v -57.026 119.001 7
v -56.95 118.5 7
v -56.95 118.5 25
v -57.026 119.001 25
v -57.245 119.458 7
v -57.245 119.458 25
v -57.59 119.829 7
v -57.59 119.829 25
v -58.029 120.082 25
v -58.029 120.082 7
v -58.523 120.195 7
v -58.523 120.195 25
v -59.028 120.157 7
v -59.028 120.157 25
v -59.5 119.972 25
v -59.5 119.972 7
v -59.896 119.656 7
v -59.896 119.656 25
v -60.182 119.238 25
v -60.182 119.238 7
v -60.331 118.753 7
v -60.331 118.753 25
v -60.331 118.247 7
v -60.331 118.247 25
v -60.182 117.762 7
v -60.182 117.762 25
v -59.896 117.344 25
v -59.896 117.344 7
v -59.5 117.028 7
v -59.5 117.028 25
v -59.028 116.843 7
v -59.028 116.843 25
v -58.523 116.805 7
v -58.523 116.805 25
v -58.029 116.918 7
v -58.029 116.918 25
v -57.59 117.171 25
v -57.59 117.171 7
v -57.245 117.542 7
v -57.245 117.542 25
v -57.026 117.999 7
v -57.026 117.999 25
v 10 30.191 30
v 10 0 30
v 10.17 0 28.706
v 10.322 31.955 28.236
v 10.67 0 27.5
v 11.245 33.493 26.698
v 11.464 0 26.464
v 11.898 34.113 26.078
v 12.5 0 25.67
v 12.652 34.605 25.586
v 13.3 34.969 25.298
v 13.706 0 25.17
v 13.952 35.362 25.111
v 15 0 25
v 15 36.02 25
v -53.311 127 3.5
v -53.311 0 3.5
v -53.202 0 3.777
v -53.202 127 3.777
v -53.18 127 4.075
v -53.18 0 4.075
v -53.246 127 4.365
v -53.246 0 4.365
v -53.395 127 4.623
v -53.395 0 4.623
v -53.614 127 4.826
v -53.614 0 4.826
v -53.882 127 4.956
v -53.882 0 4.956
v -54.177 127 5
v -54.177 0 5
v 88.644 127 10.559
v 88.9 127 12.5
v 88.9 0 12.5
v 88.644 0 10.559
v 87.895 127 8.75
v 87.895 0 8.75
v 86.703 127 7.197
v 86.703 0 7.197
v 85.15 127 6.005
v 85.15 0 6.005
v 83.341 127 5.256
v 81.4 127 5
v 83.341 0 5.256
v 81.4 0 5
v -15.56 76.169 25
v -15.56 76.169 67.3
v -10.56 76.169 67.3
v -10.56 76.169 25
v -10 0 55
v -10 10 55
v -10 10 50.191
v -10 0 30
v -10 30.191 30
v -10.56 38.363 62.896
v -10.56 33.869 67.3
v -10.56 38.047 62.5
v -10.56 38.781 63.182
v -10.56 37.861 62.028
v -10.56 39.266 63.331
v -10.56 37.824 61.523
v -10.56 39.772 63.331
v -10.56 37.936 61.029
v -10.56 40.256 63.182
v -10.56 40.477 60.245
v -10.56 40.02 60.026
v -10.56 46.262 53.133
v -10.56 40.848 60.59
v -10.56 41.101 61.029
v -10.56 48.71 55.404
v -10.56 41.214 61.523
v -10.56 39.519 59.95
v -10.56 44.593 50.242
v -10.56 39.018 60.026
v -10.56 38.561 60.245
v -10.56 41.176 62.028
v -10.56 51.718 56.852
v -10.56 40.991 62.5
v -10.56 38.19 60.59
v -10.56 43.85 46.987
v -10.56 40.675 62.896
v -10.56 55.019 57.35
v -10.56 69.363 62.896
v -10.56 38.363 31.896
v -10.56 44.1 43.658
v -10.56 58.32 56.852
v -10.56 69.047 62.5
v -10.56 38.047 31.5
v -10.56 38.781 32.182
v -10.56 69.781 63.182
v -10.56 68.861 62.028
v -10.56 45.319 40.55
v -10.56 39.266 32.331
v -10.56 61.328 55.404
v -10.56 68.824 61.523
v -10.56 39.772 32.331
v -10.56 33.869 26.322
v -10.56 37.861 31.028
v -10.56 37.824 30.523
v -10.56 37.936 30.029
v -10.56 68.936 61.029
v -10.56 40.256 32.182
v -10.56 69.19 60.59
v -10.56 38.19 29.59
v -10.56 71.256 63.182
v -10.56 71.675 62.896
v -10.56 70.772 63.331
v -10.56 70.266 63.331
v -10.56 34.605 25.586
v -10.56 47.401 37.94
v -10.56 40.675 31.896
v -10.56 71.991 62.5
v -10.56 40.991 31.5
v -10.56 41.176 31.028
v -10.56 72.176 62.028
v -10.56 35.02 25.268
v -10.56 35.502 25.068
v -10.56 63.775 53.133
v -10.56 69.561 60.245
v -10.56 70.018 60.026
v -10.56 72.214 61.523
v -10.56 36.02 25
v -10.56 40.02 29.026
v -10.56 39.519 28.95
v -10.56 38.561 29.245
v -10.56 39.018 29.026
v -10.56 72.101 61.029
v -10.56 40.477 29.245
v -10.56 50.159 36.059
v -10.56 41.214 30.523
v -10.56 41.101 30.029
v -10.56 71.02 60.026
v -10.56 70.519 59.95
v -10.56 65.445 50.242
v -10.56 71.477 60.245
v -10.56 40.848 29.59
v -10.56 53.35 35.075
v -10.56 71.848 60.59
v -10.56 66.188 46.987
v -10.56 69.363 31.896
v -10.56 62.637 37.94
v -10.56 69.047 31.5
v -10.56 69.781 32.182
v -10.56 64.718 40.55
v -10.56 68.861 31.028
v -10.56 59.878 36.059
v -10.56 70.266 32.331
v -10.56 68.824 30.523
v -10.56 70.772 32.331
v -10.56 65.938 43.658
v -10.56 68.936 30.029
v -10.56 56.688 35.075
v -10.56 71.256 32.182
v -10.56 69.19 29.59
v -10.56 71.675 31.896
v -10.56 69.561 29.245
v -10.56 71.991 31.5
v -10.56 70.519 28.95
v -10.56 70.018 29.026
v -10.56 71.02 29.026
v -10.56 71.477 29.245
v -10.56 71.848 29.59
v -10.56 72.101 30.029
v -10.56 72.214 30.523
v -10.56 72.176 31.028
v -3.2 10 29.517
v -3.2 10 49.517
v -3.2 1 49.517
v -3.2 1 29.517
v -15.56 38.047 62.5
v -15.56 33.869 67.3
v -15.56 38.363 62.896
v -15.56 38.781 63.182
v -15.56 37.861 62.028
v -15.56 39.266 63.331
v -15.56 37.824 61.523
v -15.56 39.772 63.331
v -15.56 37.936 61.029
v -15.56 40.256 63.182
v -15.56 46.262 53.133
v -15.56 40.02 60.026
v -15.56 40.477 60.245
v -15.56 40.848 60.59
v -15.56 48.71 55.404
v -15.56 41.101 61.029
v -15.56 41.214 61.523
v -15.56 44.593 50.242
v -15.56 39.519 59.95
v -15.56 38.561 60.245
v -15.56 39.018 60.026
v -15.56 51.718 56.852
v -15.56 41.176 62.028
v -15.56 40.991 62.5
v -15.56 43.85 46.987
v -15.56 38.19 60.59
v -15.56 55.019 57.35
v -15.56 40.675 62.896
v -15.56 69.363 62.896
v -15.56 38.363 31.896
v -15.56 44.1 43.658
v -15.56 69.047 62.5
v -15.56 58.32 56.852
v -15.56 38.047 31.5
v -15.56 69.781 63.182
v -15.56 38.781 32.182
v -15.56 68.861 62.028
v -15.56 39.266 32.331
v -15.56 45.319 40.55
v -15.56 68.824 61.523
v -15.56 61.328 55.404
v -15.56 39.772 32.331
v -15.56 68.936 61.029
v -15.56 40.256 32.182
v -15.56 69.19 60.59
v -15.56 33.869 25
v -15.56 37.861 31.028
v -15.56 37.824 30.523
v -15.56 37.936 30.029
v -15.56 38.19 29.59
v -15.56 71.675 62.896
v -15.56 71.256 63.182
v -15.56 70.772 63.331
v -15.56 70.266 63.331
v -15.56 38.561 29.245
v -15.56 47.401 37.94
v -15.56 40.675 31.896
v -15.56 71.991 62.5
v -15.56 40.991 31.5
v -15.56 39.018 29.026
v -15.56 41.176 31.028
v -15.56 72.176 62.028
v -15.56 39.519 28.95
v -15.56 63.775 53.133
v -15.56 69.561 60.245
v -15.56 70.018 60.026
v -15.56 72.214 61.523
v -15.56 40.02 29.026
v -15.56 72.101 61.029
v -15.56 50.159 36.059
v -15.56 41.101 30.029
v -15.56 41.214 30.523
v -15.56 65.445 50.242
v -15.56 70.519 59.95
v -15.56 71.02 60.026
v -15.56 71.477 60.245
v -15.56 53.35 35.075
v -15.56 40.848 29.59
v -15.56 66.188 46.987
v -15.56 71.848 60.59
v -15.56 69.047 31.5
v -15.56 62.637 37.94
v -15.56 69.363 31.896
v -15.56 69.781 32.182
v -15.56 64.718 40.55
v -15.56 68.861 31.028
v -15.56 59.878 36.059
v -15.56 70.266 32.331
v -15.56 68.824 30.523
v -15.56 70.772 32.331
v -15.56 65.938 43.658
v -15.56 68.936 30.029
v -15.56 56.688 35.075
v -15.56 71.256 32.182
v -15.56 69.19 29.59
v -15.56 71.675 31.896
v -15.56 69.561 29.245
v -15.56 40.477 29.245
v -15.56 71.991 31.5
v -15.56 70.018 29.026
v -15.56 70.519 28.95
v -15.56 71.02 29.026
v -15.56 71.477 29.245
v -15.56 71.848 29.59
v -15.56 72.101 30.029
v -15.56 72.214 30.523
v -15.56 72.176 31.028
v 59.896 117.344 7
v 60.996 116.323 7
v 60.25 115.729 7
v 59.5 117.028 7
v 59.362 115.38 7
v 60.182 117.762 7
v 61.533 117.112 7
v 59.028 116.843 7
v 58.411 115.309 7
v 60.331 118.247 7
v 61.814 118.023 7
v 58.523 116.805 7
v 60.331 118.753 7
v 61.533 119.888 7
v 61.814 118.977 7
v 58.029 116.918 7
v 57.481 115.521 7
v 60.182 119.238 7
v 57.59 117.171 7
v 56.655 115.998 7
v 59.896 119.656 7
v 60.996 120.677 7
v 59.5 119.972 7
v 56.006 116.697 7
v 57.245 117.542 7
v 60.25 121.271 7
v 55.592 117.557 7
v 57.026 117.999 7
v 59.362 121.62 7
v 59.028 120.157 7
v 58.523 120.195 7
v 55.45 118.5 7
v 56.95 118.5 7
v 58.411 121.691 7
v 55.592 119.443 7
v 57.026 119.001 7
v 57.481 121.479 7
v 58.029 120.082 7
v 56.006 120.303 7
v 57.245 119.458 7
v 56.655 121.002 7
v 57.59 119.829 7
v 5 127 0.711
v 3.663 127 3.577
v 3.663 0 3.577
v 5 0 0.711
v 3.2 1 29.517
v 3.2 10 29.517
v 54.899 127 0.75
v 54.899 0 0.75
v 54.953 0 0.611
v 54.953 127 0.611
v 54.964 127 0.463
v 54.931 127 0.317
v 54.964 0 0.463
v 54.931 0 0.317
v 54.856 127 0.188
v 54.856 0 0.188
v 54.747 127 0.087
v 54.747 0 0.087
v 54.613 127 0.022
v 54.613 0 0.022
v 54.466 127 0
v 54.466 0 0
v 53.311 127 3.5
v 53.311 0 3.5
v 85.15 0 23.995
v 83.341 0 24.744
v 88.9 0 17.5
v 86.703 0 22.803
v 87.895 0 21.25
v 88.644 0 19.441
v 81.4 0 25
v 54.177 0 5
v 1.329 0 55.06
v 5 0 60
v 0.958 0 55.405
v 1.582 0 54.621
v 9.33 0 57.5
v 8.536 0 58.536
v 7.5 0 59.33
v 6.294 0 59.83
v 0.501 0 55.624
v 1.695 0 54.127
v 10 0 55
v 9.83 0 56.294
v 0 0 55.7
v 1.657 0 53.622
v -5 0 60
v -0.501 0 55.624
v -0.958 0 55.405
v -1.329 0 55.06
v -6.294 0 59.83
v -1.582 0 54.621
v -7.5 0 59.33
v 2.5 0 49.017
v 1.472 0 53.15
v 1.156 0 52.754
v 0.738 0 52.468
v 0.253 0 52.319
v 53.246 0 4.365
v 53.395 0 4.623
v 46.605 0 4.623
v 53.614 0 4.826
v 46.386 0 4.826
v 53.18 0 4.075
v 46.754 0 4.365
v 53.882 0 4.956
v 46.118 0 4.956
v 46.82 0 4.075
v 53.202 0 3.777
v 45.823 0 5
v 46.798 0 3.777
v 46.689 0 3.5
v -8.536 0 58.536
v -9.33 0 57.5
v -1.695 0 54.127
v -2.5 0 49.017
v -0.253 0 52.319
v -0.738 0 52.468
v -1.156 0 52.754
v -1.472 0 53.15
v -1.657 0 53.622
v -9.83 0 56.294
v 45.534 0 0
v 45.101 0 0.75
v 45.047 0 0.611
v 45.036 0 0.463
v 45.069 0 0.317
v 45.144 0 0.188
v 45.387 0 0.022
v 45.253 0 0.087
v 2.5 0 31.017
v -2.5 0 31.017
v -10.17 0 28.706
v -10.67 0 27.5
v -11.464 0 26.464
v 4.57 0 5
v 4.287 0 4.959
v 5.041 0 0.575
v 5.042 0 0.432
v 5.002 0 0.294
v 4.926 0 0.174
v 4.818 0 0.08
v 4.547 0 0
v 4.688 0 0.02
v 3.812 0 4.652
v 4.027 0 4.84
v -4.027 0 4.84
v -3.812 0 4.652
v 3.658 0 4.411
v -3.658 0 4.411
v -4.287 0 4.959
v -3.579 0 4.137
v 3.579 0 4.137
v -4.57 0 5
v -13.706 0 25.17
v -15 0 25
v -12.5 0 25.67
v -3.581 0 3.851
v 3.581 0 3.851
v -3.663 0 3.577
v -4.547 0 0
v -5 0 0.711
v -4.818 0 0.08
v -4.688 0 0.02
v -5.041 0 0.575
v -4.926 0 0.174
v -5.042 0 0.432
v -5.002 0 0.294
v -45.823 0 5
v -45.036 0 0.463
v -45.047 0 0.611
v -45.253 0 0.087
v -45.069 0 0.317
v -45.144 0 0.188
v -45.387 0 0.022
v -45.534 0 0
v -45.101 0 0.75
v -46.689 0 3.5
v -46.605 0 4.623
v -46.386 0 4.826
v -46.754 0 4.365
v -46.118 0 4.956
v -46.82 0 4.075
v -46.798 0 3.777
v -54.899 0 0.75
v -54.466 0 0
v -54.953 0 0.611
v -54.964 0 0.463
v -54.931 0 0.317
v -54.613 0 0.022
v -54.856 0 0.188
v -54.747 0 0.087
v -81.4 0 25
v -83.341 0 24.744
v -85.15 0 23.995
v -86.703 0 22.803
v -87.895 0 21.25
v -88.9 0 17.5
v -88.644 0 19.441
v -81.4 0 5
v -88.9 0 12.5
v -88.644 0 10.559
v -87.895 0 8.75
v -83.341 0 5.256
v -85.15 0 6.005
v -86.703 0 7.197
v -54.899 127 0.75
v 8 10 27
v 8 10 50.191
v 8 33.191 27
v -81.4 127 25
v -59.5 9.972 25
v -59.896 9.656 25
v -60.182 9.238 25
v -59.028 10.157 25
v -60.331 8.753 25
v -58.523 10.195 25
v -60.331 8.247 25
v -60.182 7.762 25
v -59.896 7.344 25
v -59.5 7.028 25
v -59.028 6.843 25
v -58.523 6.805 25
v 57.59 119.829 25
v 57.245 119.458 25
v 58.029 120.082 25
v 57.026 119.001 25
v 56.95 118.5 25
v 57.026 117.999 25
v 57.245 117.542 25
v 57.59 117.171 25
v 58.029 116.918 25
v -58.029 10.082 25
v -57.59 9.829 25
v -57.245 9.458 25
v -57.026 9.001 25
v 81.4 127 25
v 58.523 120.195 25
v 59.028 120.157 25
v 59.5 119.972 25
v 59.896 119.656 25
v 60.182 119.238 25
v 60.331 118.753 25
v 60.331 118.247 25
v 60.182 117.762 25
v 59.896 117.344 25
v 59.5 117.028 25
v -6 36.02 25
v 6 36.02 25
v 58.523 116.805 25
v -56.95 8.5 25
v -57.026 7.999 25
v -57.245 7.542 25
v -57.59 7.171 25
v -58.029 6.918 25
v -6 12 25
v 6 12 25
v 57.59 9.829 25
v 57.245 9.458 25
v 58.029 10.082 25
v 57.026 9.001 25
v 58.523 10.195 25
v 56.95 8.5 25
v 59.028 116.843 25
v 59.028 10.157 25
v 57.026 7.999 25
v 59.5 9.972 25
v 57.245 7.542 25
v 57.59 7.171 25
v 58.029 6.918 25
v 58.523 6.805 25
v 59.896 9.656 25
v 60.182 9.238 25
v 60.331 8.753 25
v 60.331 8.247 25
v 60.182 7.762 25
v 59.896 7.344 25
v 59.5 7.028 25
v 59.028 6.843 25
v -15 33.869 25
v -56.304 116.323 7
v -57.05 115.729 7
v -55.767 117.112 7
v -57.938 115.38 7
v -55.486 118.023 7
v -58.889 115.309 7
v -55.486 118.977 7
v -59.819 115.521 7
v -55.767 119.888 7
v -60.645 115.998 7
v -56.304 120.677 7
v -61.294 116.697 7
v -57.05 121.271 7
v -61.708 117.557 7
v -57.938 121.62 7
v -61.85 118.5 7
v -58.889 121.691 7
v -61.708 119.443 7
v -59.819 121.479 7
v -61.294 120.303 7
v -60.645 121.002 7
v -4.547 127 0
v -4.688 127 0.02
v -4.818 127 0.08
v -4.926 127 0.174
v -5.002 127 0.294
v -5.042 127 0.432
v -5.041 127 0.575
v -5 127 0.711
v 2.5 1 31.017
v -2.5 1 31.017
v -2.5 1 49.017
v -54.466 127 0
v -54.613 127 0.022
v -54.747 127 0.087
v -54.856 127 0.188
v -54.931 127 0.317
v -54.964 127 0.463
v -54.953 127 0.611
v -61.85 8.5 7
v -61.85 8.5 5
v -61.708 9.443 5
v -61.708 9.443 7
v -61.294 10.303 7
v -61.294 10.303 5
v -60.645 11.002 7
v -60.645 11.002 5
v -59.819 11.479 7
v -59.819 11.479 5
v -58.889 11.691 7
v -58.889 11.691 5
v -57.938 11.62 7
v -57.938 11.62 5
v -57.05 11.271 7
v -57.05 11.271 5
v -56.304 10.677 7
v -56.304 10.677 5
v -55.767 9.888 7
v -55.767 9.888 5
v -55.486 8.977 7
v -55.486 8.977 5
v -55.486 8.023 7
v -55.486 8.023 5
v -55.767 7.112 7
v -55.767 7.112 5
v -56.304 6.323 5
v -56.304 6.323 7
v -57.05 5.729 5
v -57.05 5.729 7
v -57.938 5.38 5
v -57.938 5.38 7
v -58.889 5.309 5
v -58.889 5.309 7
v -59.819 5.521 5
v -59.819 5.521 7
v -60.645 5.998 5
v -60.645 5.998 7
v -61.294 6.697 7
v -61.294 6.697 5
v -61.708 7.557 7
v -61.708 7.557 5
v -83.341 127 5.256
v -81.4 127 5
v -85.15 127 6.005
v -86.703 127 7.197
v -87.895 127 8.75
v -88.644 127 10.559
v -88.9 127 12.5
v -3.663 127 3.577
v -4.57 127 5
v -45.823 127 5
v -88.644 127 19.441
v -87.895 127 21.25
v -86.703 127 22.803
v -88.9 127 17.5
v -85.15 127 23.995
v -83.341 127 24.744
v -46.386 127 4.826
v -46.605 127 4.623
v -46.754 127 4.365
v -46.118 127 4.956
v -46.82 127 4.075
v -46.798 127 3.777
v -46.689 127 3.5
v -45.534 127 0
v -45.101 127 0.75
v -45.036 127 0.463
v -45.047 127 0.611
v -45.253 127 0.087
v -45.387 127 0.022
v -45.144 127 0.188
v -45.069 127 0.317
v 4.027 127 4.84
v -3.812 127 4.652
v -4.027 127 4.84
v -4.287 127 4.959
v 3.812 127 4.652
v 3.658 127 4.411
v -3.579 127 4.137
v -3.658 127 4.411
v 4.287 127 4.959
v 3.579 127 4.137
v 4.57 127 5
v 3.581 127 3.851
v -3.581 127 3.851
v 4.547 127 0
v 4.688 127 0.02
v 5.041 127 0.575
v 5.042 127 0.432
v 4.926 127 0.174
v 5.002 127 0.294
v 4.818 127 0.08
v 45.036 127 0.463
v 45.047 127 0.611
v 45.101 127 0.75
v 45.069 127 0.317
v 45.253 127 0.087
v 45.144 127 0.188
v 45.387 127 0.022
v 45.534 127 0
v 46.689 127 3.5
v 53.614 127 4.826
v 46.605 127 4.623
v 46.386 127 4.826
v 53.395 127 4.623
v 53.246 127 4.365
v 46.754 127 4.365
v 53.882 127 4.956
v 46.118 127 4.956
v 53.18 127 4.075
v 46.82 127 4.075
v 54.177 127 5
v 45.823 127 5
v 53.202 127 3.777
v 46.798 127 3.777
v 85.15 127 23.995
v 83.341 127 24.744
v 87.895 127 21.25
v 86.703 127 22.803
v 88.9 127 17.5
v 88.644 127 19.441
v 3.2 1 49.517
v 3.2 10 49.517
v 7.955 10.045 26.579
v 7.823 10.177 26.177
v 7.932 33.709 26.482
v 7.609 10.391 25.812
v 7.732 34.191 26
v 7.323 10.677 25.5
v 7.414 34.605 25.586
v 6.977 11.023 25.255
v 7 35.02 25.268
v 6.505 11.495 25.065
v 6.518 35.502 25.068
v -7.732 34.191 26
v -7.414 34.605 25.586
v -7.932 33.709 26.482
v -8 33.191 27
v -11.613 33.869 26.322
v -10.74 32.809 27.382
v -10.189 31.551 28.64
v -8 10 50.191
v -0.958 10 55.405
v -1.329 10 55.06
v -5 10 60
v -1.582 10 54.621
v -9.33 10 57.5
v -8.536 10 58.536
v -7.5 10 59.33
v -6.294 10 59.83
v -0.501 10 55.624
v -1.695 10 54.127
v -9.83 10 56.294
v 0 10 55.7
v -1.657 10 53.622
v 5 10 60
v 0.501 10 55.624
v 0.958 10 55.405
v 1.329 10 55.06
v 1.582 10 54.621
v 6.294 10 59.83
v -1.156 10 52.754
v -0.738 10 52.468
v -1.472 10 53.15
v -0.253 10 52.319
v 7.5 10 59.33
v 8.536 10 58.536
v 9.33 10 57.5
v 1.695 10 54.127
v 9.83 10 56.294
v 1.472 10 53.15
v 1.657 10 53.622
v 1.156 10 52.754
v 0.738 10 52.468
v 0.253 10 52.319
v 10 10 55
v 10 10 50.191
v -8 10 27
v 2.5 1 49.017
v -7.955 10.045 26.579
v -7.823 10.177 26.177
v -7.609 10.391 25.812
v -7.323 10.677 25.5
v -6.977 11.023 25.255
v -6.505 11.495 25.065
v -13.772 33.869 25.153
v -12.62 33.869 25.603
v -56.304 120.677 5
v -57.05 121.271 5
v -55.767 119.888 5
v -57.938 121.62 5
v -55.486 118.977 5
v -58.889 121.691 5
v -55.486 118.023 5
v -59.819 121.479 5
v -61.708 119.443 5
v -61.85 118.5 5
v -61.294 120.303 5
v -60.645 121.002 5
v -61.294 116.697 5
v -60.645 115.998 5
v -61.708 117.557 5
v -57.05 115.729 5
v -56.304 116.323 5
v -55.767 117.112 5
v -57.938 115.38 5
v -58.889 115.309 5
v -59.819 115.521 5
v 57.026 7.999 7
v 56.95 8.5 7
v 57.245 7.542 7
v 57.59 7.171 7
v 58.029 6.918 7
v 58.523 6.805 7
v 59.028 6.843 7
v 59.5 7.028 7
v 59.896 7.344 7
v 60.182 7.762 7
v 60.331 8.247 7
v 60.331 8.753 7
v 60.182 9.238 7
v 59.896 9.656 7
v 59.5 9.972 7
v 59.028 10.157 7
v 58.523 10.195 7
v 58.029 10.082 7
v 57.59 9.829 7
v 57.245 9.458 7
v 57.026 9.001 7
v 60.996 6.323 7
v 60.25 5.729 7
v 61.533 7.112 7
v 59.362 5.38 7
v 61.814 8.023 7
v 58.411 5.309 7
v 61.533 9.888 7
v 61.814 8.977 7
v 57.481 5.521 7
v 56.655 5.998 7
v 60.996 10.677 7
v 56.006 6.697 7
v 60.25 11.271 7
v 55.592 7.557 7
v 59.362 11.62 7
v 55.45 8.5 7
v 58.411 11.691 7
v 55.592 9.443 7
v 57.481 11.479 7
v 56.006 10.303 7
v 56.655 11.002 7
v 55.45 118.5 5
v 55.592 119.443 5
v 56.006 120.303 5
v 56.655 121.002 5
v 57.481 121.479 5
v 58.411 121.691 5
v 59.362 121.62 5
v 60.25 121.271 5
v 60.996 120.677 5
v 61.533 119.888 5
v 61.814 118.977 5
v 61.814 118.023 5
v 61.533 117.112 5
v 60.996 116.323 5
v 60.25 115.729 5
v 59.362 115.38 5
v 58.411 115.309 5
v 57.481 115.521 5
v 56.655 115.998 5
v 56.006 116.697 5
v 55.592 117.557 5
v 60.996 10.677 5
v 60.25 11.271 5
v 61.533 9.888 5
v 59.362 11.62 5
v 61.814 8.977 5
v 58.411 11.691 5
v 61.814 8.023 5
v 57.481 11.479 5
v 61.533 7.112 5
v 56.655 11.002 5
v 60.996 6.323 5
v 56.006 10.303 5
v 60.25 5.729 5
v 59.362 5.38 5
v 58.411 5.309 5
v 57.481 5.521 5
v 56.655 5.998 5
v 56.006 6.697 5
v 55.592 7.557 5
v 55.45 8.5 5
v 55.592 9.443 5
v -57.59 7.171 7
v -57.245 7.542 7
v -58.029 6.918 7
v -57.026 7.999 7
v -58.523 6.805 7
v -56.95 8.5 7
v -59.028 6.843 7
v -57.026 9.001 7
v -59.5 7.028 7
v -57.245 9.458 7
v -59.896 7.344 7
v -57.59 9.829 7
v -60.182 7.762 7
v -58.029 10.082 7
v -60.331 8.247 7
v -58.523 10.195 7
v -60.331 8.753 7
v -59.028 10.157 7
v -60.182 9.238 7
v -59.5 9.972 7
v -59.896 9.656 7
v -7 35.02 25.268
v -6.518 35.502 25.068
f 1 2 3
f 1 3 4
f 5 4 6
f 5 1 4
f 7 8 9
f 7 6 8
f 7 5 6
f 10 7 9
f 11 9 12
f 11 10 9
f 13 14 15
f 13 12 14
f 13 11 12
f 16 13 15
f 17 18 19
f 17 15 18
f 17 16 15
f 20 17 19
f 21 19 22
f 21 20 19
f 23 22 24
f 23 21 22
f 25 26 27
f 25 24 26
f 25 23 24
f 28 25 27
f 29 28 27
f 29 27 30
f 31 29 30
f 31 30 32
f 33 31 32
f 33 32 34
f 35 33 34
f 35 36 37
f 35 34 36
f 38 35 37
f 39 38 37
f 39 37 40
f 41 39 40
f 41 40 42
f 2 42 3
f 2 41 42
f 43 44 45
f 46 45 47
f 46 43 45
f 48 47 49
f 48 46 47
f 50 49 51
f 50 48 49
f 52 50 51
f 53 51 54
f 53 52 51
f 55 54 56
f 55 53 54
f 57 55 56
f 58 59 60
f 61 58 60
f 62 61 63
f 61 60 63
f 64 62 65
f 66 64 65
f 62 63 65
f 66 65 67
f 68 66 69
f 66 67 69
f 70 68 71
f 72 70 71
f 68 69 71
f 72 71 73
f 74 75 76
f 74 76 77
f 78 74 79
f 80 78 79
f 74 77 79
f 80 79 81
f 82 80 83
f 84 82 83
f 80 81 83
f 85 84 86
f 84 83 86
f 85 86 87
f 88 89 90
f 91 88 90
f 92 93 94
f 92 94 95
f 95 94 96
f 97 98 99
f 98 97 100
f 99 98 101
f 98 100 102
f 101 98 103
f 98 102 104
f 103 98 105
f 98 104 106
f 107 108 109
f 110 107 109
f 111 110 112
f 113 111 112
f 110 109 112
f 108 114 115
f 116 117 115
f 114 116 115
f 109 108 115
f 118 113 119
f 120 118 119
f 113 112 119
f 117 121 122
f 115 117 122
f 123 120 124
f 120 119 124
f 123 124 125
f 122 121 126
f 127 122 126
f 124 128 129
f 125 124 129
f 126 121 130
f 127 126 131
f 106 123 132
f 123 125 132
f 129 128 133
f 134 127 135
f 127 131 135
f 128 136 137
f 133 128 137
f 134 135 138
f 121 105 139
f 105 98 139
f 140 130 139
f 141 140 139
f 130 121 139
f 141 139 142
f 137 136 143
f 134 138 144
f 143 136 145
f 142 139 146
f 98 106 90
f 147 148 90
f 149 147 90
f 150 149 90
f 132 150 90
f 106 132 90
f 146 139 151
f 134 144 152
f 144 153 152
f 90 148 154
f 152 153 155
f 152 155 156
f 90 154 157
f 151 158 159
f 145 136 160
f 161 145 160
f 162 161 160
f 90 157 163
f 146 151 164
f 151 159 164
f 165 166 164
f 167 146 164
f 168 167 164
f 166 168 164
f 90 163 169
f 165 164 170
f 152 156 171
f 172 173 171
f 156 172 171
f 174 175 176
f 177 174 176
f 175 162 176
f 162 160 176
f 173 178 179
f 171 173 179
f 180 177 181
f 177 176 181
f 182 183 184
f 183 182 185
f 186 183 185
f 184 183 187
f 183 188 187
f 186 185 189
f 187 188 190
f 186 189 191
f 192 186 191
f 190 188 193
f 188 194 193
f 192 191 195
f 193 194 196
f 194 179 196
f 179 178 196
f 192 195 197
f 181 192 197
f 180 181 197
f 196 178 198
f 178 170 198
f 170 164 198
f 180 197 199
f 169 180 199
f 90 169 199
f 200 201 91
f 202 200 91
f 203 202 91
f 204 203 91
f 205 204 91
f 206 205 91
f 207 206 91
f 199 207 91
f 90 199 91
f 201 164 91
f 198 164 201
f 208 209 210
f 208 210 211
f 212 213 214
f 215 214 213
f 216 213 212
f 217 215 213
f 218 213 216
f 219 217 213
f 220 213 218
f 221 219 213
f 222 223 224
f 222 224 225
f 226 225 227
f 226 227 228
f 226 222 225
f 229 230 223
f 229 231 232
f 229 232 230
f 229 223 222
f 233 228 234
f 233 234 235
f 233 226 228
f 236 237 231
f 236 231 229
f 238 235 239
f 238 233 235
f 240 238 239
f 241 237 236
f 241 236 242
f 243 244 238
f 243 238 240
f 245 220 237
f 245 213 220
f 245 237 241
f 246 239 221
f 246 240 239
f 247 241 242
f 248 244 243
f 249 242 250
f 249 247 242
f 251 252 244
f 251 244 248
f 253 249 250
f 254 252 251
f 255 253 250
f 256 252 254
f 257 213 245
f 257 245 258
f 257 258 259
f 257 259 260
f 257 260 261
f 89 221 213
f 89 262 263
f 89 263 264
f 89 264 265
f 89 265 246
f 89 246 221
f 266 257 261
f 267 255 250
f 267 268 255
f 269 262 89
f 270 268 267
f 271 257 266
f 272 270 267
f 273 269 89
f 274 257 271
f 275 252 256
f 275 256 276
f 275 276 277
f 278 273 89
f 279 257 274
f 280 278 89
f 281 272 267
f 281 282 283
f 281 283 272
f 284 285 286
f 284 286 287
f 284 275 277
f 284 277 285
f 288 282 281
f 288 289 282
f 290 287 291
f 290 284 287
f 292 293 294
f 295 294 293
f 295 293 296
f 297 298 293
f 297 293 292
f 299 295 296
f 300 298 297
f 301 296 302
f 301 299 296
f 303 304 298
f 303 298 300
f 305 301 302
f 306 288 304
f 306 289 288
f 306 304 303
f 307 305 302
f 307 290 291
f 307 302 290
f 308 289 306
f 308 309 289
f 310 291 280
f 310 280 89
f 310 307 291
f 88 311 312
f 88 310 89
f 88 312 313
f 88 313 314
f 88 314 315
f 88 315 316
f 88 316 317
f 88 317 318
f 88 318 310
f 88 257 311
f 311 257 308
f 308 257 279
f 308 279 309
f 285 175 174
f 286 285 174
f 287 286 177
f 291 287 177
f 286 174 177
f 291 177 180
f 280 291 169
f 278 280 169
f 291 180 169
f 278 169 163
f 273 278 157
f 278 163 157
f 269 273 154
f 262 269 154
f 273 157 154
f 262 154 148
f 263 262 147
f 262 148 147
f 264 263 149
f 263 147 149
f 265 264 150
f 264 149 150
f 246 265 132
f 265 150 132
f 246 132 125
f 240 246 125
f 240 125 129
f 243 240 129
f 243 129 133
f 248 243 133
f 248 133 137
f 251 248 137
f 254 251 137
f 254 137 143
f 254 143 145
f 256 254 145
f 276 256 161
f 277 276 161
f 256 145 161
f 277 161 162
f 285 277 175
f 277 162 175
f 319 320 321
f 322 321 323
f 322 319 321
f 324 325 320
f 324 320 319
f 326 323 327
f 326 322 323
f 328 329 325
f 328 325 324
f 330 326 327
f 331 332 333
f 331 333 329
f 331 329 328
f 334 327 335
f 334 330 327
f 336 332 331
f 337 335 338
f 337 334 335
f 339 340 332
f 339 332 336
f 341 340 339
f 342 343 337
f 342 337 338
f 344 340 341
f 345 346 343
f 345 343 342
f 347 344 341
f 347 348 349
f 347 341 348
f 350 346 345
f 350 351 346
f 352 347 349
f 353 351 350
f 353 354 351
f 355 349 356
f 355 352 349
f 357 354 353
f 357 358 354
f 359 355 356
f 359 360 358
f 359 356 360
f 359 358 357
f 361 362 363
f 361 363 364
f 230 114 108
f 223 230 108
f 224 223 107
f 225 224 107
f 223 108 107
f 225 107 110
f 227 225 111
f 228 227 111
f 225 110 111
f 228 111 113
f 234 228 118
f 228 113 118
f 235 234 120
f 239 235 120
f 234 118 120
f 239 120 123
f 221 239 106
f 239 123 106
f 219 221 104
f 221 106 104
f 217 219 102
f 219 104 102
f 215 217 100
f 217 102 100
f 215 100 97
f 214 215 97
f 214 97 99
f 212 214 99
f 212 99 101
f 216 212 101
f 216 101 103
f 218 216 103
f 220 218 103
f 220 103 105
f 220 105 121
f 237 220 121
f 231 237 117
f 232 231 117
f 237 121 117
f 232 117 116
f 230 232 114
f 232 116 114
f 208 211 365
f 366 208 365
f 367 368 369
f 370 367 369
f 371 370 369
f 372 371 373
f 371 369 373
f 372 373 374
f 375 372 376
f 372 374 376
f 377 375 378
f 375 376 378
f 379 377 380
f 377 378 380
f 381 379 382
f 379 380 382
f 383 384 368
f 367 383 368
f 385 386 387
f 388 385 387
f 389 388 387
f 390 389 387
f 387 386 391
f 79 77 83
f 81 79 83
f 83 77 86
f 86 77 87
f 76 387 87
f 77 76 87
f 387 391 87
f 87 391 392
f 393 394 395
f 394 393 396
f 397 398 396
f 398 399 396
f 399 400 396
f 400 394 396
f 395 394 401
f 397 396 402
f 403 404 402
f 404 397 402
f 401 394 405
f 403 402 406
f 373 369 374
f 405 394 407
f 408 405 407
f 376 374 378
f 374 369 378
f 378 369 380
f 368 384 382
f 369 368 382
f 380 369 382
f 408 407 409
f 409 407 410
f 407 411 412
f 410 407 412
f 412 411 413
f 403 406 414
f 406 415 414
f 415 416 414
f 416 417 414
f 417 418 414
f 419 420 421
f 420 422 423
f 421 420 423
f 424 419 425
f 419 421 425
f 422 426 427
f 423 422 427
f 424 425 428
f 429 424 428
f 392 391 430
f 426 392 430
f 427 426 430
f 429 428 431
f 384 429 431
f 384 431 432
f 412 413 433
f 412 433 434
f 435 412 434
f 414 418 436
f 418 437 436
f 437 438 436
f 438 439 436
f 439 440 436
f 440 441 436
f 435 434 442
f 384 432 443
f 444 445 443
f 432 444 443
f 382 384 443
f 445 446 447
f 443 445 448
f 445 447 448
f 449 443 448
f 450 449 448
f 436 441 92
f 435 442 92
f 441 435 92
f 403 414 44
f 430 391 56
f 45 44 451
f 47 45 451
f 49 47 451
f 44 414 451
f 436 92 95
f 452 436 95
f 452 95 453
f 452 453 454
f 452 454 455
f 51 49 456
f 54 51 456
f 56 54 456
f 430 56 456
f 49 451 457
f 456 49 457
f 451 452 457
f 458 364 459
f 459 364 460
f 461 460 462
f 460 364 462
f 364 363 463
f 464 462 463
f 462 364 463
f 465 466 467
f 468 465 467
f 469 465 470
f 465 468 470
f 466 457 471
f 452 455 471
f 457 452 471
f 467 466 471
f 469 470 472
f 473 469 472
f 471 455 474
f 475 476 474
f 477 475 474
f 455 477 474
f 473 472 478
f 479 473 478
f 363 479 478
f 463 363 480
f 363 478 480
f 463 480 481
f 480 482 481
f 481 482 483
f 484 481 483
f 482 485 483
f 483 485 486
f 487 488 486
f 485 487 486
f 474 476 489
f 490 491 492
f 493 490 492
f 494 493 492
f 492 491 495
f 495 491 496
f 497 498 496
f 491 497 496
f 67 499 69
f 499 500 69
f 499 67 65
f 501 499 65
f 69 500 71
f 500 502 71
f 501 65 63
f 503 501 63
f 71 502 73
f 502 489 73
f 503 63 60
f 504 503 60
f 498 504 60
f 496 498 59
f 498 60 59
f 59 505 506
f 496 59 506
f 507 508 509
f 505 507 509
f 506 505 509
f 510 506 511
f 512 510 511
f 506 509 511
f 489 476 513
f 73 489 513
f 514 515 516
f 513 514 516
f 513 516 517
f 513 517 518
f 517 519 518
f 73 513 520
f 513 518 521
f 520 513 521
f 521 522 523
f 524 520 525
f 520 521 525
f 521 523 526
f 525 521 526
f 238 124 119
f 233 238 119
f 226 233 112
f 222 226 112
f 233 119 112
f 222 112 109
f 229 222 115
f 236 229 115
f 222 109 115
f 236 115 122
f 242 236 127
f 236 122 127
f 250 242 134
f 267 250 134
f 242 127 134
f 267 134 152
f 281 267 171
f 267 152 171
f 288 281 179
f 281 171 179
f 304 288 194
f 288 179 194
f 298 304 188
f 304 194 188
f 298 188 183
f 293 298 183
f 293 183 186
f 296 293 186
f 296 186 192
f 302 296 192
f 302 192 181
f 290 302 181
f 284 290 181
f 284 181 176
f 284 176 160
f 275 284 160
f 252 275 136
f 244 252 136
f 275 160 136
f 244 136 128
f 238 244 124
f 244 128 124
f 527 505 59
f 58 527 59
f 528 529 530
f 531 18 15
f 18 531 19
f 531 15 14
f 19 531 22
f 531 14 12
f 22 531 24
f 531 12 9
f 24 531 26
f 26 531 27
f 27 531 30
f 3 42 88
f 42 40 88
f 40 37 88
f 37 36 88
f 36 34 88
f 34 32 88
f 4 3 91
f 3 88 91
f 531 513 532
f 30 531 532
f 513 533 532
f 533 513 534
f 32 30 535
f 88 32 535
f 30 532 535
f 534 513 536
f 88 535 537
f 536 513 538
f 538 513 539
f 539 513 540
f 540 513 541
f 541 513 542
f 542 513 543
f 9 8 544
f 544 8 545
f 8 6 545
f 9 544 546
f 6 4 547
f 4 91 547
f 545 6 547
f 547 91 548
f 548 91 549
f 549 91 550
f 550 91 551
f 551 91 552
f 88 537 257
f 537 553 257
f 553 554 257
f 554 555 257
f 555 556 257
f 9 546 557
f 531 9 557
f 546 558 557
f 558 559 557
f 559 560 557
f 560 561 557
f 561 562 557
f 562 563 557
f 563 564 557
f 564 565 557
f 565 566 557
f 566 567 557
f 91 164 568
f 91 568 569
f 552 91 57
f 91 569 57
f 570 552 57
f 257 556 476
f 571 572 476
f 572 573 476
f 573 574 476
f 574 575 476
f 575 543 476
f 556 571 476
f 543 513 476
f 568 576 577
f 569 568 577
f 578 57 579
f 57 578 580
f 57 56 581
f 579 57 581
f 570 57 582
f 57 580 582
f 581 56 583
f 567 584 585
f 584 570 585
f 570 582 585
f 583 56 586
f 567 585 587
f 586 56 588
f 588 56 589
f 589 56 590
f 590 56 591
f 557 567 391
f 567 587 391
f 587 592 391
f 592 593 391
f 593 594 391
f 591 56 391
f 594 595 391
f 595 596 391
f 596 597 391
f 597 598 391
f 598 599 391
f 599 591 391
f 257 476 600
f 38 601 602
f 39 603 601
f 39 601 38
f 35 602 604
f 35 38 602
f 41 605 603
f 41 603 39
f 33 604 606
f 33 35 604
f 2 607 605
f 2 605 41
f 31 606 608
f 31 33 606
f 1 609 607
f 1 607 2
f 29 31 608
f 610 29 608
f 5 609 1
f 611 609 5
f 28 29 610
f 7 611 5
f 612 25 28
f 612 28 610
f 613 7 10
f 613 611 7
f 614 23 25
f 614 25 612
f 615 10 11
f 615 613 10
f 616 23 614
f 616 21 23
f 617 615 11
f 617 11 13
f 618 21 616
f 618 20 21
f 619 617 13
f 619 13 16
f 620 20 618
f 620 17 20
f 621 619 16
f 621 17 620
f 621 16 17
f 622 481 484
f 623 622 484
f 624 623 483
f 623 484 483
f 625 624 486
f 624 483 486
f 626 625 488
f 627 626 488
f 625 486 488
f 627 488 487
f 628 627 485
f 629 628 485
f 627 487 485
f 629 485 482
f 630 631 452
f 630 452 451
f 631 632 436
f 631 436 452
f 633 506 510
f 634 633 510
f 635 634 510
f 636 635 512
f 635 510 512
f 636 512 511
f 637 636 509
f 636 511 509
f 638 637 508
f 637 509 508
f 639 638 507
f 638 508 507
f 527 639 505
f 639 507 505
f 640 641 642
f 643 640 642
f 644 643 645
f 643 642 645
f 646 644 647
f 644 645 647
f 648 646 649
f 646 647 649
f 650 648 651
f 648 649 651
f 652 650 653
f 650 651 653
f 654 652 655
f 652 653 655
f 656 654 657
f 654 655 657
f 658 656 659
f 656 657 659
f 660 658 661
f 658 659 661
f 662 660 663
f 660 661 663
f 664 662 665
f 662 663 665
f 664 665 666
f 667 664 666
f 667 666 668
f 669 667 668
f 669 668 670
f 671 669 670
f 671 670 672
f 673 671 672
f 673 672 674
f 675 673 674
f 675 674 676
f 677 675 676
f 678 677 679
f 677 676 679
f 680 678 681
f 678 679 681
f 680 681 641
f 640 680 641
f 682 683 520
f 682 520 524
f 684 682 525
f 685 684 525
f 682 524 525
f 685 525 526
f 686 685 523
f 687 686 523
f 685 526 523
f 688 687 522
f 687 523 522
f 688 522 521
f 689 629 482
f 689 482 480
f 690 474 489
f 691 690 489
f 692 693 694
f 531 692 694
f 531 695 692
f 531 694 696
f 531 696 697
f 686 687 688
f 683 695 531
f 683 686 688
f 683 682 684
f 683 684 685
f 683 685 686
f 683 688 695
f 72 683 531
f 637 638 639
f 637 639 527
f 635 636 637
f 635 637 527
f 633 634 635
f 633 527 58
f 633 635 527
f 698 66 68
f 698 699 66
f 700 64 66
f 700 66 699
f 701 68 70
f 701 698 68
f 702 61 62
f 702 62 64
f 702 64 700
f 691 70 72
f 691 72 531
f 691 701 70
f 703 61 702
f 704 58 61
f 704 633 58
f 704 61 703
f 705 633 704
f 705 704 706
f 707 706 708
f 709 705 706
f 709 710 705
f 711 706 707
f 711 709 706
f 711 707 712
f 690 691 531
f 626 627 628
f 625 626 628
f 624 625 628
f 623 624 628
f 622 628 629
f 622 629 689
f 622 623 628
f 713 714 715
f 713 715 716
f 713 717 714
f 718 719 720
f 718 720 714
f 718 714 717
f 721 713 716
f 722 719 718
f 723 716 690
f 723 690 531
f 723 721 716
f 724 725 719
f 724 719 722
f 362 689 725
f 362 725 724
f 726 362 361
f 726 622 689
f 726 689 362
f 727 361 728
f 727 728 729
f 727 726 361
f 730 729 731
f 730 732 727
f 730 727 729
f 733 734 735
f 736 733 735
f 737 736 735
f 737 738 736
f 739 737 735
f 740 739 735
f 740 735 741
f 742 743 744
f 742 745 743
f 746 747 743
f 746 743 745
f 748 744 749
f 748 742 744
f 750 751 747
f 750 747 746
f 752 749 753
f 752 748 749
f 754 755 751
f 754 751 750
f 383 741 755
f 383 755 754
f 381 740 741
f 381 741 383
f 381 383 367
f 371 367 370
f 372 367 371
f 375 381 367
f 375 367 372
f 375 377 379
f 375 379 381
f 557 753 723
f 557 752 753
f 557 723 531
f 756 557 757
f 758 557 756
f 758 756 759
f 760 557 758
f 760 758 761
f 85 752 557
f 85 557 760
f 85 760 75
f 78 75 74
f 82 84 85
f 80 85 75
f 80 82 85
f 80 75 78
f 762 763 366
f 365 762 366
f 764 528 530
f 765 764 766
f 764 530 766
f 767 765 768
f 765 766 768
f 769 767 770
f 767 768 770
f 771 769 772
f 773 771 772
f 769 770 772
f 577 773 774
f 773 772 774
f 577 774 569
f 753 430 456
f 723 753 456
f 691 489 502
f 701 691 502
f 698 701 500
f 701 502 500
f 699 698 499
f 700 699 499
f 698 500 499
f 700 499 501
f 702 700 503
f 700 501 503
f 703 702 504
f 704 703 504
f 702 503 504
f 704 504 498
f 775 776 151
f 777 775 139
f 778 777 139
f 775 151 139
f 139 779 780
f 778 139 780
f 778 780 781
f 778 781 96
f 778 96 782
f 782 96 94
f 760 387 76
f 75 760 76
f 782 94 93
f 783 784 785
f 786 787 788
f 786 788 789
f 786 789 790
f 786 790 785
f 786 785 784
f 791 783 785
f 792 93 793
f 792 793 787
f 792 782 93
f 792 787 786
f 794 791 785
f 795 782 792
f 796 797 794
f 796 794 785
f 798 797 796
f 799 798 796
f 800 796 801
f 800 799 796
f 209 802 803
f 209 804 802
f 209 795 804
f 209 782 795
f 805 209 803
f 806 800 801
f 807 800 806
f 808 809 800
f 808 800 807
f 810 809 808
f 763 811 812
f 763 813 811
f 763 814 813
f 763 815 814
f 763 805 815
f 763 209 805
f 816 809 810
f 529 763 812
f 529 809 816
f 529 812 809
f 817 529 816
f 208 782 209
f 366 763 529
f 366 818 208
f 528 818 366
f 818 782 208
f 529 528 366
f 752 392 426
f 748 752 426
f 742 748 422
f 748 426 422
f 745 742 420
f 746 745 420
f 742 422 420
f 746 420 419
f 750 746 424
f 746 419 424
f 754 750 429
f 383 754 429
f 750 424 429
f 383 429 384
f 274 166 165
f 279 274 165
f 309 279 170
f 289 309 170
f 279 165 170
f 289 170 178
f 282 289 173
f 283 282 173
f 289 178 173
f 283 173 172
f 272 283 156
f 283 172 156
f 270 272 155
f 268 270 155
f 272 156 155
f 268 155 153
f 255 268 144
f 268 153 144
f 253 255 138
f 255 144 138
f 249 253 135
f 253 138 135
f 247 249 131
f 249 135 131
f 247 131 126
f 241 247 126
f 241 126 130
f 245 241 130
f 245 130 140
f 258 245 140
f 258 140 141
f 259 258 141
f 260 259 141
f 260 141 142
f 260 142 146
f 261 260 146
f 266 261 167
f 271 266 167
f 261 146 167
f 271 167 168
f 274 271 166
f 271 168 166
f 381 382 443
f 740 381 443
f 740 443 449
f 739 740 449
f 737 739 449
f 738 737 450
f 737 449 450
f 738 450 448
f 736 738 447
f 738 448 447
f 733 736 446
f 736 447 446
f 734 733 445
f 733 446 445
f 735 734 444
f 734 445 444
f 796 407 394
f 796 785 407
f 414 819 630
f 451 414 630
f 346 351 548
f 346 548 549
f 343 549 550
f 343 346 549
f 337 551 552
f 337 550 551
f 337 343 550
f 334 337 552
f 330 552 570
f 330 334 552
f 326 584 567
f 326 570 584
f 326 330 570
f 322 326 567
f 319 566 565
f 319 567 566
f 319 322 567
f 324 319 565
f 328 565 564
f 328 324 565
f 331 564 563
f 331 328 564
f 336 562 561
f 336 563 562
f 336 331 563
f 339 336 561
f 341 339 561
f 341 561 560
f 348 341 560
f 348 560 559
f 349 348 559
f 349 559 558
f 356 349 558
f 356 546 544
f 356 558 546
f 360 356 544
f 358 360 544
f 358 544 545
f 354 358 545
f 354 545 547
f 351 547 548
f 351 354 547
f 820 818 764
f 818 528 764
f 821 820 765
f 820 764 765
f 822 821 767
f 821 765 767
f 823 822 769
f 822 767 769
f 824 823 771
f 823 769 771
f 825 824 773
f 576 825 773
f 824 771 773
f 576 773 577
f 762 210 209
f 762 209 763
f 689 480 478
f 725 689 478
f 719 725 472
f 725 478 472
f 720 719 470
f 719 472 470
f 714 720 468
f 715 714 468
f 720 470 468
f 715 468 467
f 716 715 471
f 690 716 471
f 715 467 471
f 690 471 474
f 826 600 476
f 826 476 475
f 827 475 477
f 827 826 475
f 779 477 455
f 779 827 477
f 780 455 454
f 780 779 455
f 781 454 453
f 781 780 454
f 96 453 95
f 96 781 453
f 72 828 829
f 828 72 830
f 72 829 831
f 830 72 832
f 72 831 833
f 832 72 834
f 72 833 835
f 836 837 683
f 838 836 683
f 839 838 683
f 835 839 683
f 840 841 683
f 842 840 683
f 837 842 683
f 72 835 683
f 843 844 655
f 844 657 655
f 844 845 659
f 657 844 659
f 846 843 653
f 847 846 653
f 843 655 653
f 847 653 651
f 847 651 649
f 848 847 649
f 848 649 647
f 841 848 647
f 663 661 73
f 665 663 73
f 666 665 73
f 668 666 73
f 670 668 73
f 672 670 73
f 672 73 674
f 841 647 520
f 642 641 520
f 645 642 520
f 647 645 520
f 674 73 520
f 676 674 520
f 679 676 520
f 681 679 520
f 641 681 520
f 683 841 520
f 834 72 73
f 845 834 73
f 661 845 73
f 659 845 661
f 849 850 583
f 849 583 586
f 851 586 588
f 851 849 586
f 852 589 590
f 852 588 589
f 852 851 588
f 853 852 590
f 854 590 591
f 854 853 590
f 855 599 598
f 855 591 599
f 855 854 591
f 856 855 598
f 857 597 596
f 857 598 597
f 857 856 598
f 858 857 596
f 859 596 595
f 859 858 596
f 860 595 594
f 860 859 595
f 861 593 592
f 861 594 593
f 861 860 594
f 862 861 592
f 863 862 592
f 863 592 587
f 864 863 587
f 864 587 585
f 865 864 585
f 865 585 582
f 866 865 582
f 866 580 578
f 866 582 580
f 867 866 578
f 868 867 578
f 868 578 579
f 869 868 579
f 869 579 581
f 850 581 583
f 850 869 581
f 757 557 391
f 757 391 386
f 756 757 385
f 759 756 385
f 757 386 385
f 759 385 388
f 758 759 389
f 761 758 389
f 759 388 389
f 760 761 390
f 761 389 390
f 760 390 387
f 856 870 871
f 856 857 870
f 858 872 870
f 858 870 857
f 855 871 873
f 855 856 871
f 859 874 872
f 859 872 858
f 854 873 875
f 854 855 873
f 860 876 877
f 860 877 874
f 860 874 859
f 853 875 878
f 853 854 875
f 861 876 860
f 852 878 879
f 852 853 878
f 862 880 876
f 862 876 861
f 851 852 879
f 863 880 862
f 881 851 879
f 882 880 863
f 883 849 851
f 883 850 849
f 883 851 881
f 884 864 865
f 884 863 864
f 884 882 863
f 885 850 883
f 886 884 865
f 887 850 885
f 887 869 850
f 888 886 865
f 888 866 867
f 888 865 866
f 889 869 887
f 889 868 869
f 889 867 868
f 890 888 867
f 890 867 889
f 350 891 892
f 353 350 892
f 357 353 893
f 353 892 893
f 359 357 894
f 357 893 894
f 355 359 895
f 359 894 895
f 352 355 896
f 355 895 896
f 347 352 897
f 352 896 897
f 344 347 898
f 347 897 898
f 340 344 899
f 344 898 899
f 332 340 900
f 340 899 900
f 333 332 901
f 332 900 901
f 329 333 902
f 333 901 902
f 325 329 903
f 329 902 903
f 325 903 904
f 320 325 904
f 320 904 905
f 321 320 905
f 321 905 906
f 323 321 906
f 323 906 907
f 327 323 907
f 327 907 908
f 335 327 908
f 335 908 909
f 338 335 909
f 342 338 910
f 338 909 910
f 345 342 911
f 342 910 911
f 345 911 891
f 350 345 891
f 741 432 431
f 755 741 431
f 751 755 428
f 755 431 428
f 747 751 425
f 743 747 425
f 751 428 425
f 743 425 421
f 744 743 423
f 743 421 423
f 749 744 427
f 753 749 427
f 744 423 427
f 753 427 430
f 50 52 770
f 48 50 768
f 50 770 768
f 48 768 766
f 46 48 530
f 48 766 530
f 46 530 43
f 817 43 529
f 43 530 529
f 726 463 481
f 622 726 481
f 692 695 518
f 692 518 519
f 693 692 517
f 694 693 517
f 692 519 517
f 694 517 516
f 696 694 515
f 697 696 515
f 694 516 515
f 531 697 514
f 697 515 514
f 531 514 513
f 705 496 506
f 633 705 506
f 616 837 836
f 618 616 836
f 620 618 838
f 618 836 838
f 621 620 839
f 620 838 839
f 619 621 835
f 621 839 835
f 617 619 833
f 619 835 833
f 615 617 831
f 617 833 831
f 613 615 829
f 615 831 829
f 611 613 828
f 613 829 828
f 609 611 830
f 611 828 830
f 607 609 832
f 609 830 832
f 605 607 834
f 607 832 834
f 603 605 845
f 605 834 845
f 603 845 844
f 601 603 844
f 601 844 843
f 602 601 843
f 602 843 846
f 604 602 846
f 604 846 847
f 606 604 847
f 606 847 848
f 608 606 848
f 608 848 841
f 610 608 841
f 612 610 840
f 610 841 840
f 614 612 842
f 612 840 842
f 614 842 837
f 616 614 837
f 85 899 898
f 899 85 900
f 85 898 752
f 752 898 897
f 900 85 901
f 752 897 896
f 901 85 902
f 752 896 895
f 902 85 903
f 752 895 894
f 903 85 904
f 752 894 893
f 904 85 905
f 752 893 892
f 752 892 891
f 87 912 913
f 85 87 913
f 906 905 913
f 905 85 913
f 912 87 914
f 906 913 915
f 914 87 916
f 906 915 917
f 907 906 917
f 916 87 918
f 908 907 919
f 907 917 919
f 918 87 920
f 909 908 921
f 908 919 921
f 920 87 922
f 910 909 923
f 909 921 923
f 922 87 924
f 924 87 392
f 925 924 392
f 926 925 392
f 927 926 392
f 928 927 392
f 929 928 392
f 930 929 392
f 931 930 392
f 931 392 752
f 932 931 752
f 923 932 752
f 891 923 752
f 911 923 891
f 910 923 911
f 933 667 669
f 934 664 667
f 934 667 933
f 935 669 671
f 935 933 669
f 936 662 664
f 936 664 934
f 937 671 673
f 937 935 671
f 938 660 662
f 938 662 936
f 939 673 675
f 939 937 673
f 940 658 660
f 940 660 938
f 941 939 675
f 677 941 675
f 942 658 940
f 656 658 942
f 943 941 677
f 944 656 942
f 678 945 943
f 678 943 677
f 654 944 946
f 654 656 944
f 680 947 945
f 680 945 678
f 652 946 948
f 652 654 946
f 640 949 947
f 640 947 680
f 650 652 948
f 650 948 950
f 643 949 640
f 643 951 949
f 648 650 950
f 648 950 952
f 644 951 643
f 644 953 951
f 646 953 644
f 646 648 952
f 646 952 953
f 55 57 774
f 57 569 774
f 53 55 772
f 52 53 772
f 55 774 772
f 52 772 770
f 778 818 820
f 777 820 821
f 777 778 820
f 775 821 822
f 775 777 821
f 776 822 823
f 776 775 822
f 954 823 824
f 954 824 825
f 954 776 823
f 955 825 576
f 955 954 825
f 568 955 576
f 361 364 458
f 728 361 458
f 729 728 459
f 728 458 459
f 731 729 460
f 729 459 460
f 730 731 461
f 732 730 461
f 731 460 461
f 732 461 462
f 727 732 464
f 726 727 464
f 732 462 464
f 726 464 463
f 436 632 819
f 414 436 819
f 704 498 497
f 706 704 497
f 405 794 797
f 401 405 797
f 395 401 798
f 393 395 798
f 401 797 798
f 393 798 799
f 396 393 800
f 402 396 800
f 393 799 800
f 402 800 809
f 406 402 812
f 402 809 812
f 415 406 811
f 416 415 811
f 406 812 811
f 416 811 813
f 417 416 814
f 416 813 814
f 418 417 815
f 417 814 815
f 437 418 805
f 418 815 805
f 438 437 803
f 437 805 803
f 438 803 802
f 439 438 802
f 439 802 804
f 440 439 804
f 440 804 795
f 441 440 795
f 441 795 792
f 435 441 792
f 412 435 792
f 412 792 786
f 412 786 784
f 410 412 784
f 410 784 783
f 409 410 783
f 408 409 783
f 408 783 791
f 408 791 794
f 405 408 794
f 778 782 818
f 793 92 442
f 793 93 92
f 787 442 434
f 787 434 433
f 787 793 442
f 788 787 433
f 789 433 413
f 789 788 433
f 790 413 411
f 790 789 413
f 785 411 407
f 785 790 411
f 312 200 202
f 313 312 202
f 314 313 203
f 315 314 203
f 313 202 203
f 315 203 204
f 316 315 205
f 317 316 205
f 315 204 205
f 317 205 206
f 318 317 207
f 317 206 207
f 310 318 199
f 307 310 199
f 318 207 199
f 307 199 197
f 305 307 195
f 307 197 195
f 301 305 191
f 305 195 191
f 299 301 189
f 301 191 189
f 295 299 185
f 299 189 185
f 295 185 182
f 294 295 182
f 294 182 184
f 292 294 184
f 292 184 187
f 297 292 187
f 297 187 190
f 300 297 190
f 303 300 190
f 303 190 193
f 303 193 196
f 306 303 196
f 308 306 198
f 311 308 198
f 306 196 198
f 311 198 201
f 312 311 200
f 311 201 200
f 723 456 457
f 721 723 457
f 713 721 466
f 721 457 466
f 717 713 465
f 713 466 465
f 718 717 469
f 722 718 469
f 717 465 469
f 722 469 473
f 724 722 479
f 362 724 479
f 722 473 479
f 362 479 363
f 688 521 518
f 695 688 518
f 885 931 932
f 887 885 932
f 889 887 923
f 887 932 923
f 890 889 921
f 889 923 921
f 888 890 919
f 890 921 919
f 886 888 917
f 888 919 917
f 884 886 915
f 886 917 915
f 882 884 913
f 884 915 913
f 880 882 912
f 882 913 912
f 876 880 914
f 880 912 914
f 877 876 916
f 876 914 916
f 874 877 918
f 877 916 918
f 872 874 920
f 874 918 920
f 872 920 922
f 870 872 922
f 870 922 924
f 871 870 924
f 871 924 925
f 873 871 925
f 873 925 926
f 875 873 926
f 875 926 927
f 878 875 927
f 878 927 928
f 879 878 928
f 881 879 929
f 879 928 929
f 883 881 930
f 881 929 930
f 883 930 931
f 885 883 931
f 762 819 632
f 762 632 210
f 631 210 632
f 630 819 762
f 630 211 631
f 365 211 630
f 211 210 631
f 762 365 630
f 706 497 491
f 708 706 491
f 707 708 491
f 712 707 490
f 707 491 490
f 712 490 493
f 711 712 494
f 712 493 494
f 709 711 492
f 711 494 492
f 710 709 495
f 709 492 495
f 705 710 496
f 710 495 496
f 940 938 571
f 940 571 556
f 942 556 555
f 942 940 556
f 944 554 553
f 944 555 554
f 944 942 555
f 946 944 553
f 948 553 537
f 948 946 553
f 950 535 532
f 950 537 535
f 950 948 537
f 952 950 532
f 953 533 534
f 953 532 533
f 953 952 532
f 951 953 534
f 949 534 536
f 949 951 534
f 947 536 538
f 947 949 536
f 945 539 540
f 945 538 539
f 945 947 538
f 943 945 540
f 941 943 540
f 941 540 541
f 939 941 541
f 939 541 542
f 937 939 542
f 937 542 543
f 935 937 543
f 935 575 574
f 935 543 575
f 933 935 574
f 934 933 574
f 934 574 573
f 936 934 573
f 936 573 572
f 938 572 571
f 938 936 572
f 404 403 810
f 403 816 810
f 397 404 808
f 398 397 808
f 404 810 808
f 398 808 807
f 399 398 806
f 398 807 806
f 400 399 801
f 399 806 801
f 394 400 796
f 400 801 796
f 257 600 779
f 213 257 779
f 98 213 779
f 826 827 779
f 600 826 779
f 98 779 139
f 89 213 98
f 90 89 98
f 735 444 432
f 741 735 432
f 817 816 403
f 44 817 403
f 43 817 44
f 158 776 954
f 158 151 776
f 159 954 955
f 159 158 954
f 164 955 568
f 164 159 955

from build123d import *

# Parameters (mm, degrees)
BOSS_EXTRUDE1_DEPTH     = 127
SKETCH3_W               = 5
SKETCH3_H               = 42.3
BOSS_EXTRUDE2_DEPTH     = 42.3
SKETCH4_R               = 1.7
CUT_EXTRUDE1_DEPTH      = 5
CUT_EXTRUDE7_DEPTH      = 161.690696682
CUT_EXTRUDE7_DEPTH_BACK = 161.690696682
SKETCH5_R               = 1.7
SKETCH8_R               = 3.2
CUT_EXTRUDE8_DEPTH      = 2
SKETCH10_W              = 20
SKETCH10_H              = 10
BOSS_EXTRUDE3_DEPTH     = 35
FILLET3_R               = 5
SKETCH12_R              = 1.7
CUT_EXTRUDE9_DEPTH      = 35
RIB47_START             = -2
RIB47_DEPTH             = 2
FILLET7_R               = 5
FILLET8_R               = 2
SKETCH18_W              = 6.4
SKETCH18_H              = 20
CUT_EXTRUDE10_DEPTH     = 9
SKETCH19_W              = 5
SKETCH19_H              = 18
CUT_EXTRUDE11_DEPTH     = 4


# Read off the part's stored shape, not the designer's step: Rib47
with BuildPart() as part:
    # Sketch2 → Boss-Extrude1 (new body)
    with BuildSketch(Plane(origin=(0, 0, 0), x_dir=(1, 0, 0), z_dir=(0, 1, 0))):
        with BuildLine():
            ThreePointArc((-4.546695502, 0), (-4.968391225, -0.231350196), (-4.999849396, -0.711309131))
            Line((-4.999849396, -0.711309131), (-3.66337779, -3.577381738))
            ThreePointArc((-3.66337779, -3.577381738), (-3.726294131, -4.537299608), (-4.569685577, -5))
            Line((-4.569685577, -5), (-45.823162248, -5))
            ThreePointArc((-45.823162248, -5), (-46.689187651, -4.5), (-46.689187651, -3.5))
            Line((-46.689187651, -3.5), (-45.101474411, -0.75))
            ThreePointArc((-45.101474411, -0.75), (-45.101474411, -0.25), (-45.534487113, 0))
            Line((-45.534487113, 0), (-54.465512887, 0))
            ThreePointArc((-54.465512887, 0), (-54.898525589, -0.25), (-54.898525589, -0.75))
            Line((-54.898525589, -0.75), (-53.310812349, -3.5))
            ThreePointArc((-53.310812349, -3.5), (-53.310812349, -4.5), (-54.176837752, -5))
            Line((-54.176837752, -5), (-81.4, -5))
            ThreePointArc((-81.4, -5), (-86.703300859, -7.196699141), (-88.9, -12.5))
            Line((-88.9, -12.5), (-88.9, -17.5))
            ThreePointArc((-88.9, -17.5), (-86.703300859, -22.803300859), (-81.4, -25))
            Line((-81.4, -25), (81.4, -25))
            ThreePointArc((81.4, -25), (86.703300859, -22.803300859), (88.9, -17.5))
            Line((88.9, -17.5), (88.9, -12.5))
            ThreePointArc((88.9, -12.5), (86.703300859, -7.196699141), (81.4, -5))
            Line((81.4, -5), (54.176837752, -5))
            ThreePointArc((54.176837752, -5), (53.310812349, -4.5), (53.310812349, -3.5))
            Line((53.310812349, -3.5), (54.898525589, -0.75))
            ThreePointArc((54.898525589, -0.75), (54.898525589, -0.25), (54.465512887, 0))
            Line((54.465512887, 0), (45.534487113, 0))
            ThreePointArc((45.534487113, 0), (45.101474411, -0.25), (45.101474411, -0.75))
            Line((45.101474411, -0.75), (46.689187651, -3.5))
            ThreePointArc((46.689187651, -3.5), (46.689187651, -4.5), (45.823162248, -5))
            Line((45.823162248, -5), (4.569685577, -5))
            ThreePointArc((4.569685577, -5), (3.726294131, -4.537299608), (3.66337779, -3.577381738))
            Line((3.66337779, -3.577381738), (4.999849396, -0.711309131))
            ThreePointArc((4.999849396, -0.711309131), (4.968391225, -0.231350196), (4.546695502, 0))
            Line((4.546695502, 0), (-4.546695502, 0))
        make_face()
    extrude(amount=BOSS_EXTRUDE1_DEPTH)

    # Sketch3 → Boss-Extrude2 (add)
    with BuildSketch(Plane.XY.offset(25)):
        with Locations((-13.06, 55.018873206)):
            Rectangle(SKETCH3_W, SKETCH3_H)
    extrude(amount=BOSS_EXTRUDE2_DEPTH)

    # Sketch4 → Cut-Extrude1 (cut)
    with BuildSketch(Plane(origin=(-10.56, 0, 0), x_dir=(0, 0, -1), z_dir=(1, 0, 0))):
        with BuildLine():
            ThreePointArc((-34.95, 55.018873206), (-46.15, 66.218873206), (-57.35, 55.018873206))
            Line((-57.35, 55.018873206), (-34.95, 55.018873206))
        make_face()
        with BuildLine():
            Line((-34.95, 55.018873206), (-57.35, 55.018873206))
            ThreePointArc((-57.35, 55.018873206), (-46.15, 43.818873206), (-34.95, 55.018873206))
        make_face()
        with Locations((-61.65, 70.518873206)):
            Circle(SKETCH4_R)
        with Locations((-30.65, 70.518873206)):
            Circle(SKETCH4_R)
        with Locations((-30.65, 39.518873206)):
            Circle(SKETCH4_R)
        with Locations((-61.65, 39.518873206)):
            Circle(SKETCH4_R)
    extrude(amount=-CUT_EXTRUDE1_DEPTH, mode=Mode.SUBTRACT)

    # Sketch5 → Cut-Extrude7 (cut, two sides: drawn at the far end of the back side and taken through both)
    with BuildSketch(Plane.XY.offset(25).offset(-CUT_EXTRUDE7_DEPTH_BACK)):
        with Locations((-58.65, 118.5)):
            Circle(SKETCH5_R)
        with Locations(Location((58.65, 118.5, 0), (0, 0, 180))):
            Circle(SKETCH5_R)
        with Locations(Location((58.65, 8.5, 0), (0, 0, 180))):
            Circle(SKETCH5_R)
        with Locations((-58.65, 8.5)):
            Circle(SKETCH5_R)
    extrude(amount=CUT_EXTRUDE7_DEPTH + CUT_EXTRUDE7_DEPTH_BACK, mode=Mode.SUBTRACT)

    # Sketch8 → Cut-Extrude8 (cut)
    with BuildSketch(Plane(origin=(0, 0, 5), x_dir=(-1, 0, 0), z_dir=(0, 0, -1))):
        with Locations((-58.65, 118.5)):
            Circle(SKETCH8_R)
        with Locations((-58.65, 8.5)):
            Circle(SKETCH8_R)
        with Locations((58.65, 118.5)):
            Circle(SKETCH8_R)
        with Locations((58.65, 8.5)):
            Circle(SKETCH8_R)
    extrude(amount=-CUT_EXTRUDE8_DEPTH, mode=Mode.SUBTRACT)

    # Sketch10 → Boss-Extrude3 (add)
    with BuildSketch(Plane.XY.offset(25)):
        with Locations((0, 5)):
            Rectangle(SKETCH10_W, SKETCH10_H)
    extrude(amount=BOSS_EXTRUDE3_DEPTH)

    # Fillet3
    fillet3_edges = [part.edges().sort_by_distance(p)[0] for p in [
        (-10, 5, 60),
        (10, 5, 60),
    ]]
    fillet(fillet3_edges, radius=FILLET3_R)

    # Sketch12 → Cut-Extrude9 (cut)
    with BuildSketch(Plane(origin=(0, 10, 0), x_dir=(1, 0, 0), z_dir=(0, 1, 0))):
        with Locations(Location((0, -54, 0), (0, 0, 270))):
            Circle(SKETCH12_R)
    extrude(amount=-CUT_EXTRUDE9_DEPTH, mode=Mode.SUBTRACT)

    # Rib47 outline → Rib47 (add)
    with BuildSketch(Plane(origin=(10, 0, 0), x_dir=(0, 0, -1), z_dir=(1, 0, 0)).offset(RIB47_START)):
        Polygon((-25, 35.191123447), (-50.191123447, 10), (-25, 10), align=None)
    rib47 = extrude(amount=RIB47_DEPTH)

    # Mirror1: Rib47 across plane
    add(rib47.mirror(Plane(origin=(0, 0, 0), x_dir=(0, 0, 1), z_dir=(1, 0, 0))))

    # Fillet7
    # the kernel refuses this fillet: 5 mm, written as the material it adds along each edge
    with BuildSketch(Plane(origin=(-10, 47.691123447, 25), x_dir=(-1, 0, 0), z_dir=(0, -1, 0))) as fillet7_piece_1_section:
        with BuildLine():
            CenterArc((FILLET7_R, -FILLET7_R), FILLET7_R, 90, 90)
            Line((0, -FILLET7_R), (0, 0))
            Line((0, 0), (FILLET7_R, 0))
        make_face()
    fillet7_piece_1 = extrude(amount=47.691123447, mode=Mode.PRIVATE)
    fillet7_piece_1 = split(fillet7_piece_1, bisect_by=Plane(origin=(-11.152129269, 25.569946894, 34.621176553), z_dir=(0, -0.7071067811865476, -0.7071067811865476)), keep=Keep.TOP, mode=Mode.PRIVATE)
    add(fillet7_piece_1)
    with BuildSketch(Plane(origin=(10, 47.691123447, 25), x_dir=(0, 0, 1), z_dir=(0, -1, 0))) as fillet7_piece_2_section:
        with BuildLine():
            CenterArc((FILLET7_R, -FILLET7_R), FILLET7_R, 90, 90)
            Line((0, -FILLET7_R), (0, 0))
            Line((0, 0), (FILLET7_R, 0))
        make_face()
    fillet7_piece_2 = extrude(amount=47.691123447, mode=Mode.PRIVATE)
    fillet7_piece_2 = split(fillet7_piece_2, bisect_by=Plane(origin=(11.152129269, 25.569946894, 34.621176553), z_dir=(0, -0.7071067811865476, -0.7071067811865476)), keep=Keep.TOP, mode=Mode.PRIVATE)
    add(fillet7_piece_2)

    # Fillet8
    fillet8_edges = [part.edges().sort_by_distance(p)[0] for p in [
        (0, 10, 25),
        (8, 22.595561724, 25),
        (11.5, 35.191123447, 25),
        (-9.28, 35.191123447, 25),
        (-8, 22.595561724, 25),
    ]]
    fillet(fillet8_edges, radius=FILLET8_R)

    # Sketch18 → Cut-Extrude10 (cut)
    with BuildSketch(Plane(origin=(0, 10, 0), x_dir=(1, 0, 0), z_dir=(0, 1, 0))):
        with Locations((0, -39.517084206)):
            Rectangle(SKETCH18_W, SKETCH18_H)
    extrude(amount=-CUT_EXTRUDE10_DEPTH, mode=Mode.SUBTRACT)

    # Sketch19 → Cut-Extrude11 (cut)
    with BuildSketch(Plane(origin=(0, 1, 0), x_dir=(1, 0, 0), z_dir=(0, 1, 0))):
        with Locations((0, -40.017084206)):
            Rectangle(SKETCH19_W, SKETCH19_H)
    extrude(amount=-CUT_EXTRUDE11_DEPTH, mode=Mode.SUBTRACT)


solid = part.part
